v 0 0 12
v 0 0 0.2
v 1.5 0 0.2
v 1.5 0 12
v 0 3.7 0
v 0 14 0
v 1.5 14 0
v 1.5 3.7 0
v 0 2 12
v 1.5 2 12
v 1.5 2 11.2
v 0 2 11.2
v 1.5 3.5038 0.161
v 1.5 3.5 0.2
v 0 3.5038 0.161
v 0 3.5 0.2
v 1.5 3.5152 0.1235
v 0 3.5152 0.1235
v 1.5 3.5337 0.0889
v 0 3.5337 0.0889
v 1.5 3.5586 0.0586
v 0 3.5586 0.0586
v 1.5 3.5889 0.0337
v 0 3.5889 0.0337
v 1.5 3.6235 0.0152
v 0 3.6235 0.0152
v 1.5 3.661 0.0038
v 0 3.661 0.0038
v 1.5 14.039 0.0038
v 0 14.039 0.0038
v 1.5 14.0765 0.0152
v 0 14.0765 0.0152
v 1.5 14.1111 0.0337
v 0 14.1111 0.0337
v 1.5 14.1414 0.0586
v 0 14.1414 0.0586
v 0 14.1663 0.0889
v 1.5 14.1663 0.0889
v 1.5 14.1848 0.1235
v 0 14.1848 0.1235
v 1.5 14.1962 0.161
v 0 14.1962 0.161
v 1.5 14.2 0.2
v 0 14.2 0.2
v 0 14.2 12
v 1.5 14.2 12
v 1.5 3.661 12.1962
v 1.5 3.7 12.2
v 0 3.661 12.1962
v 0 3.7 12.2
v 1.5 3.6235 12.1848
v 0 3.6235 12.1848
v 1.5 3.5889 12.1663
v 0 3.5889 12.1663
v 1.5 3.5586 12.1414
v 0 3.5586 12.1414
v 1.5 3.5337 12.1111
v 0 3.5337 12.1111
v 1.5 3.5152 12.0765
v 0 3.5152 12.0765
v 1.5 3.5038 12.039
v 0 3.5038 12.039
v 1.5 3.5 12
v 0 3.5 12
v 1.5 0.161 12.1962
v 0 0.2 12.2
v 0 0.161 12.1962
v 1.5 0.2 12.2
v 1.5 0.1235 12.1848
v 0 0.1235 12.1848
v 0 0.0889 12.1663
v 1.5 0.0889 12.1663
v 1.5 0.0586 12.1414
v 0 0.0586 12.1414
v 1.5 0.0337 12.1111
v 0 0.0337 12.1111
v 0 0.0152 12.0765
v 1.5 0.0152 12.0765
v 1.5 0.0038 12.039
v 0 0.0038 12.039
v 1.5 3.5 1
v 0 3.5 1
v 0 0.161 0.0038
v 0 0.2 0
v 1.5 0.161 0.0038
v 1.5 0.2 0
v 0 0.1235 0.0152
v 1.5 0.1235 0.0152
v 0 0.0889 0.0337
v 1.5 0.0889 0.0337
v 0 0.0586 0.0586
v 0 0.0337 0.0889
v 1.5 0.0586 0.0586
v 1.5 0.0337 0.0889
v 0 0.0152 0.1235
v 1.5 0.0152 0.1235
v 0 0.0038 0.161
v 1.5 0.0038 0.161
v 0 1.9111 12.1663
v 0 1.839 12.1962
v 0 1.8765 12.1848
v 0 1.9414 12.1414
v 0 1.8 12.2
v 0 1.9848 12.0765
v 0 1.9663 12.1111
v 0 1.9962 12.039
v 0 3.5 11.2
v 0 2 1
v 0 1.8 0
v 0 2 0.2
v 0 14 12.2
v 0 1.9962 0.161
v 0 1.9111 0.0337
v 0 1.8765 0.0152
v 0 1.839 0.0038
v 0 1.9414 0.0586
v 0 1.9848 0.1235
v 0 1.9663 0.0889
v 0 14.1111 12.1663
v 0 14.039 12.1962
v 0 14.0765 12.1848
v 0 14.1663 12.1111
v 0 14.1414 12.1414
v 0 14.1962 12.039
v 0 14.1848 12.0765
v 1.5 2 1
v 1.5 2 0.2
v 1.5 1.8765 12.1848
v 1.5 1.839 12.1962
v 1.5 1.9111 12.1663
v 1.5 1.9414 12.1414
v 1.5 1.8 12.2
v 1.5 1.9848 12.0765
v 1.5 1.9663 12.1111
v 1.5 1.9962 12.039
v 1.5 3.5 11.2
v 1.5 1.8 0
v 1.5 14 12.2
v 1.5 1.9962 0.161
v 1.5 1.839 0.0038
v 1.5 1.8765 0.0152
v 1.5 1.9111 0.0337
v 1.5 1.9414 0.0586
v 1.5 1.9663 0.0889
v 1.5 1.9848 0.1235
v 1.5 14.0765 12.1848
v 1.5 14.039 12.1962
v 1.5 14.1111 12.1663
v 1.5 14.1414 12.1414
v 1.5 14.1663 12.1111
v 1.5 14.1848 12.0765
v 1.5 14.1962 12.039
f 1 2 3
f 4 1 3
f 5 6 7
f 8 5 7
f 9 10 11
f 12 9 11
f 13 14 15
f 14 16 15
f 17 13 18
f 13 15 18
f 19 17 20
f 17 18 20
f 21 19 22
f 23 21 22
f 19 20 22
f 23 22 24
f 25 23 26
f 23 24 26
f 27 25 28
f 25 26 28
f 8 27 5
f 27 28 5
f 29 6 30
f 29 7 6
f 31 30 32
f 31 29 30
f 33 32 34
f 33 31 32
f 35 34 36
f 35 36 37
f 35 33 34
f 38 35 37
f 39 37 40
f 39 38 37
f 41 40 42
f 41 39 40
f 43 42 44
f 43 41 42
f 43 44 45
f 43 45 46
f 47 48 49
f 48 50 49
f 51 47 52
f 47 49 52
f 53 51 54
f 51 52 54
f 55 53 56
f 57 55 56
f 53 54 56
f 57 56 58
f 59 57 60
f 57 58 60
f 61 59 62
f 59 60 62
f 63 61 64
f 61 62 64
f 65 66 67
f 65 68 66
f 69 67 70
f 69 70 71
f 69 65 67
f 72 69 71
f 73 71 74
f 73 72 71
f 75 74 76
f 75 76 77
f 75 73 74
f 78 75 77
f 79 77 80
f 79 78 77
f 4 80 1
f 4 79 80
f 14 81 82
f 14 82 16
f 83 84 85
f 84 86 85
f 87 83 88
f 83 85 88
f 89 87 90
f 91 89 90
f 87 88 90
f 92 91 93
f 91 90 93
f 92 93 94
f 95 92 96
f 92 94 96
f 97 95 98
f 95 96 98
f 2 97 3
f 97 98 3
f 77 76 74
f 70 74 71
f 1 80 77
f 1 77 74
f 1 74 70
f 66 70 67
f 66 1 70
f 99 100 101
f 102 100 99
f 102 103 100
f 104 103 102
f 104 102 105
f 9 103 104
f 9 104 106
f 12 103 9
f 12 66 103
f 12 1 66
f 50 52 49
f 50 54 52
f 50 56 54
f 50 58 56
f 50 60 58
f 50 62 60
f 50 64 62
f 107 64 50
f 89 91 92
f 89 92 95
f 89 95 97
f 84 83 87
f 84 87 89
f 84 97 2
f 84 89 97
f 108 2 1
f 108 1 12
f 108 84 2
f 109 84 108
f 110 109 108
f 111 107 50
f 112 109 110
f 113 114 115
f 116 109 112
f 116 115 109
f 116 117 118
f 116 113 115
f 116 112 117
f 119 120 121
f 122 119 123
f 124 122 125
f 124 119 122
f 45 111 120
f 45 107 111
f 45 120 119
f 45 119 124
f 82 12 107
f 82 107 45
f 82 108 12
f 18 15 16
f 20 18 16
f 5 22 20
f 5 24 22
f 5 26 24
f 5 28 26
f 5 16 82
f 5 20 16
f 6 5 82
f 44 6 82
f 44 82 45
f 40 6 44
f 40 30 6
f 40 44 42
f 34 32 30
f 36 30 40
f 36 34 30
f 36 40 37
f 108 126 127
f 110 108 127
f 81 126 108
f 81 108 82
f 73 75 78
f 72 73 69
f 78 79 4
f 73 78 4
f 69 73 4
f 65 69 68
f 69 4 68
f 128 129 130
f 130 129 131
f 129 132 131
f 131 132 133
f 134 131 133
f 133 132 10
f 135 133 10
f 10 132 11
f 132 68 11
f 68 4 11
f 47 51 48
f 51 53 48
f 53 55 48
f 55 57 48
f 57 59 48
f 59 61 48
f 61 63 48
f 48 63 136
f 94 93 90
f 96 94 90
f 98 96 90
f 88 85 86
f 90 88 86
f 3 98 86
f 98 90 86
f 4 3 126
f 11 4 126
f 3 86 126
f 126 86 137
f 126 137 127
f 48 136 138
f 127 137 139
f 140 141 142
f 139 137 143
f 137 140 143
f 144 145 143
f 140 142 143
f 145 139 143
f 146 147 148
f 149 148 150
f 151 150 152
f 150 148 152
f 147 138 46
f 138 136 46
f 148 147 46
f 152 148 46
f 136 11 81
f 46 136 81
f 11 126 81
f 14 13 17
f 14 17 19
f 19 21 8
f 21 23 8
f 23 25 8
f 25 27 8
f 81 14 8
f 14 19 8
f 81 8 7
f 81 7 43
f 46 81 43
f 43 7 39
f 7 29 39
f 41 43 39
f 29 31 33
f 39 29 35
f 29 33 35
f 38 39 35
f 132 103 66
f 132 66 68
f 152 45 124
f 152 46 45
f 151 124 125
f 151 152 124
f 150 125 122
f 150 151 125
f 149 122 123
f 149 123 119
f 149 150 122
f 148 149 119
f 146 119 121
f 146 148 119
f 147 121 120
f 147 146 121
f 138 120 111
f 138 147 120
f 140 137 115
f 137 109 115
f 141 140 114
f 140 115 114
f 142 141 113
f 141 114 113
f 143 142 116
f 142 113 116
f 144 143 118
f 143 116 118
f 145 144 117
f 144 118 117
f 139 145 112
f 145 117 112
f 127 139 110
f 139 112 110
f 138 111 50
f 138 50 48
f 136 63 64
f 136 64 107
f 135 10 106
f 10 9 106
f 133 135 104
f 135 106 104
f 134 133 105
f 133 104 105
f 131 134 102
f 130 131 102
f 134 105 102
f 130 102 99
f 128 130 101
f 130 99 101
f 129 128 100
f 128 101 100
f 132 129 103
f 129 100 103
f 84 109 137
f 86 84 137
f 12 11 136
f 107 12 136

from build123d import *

# Parameters (mm, degrees)
SKETCH_1_W          = 1.5
SKETCH_1_H          = 14.2
EXTRUDE_1_DEPTH     = 12.2
CUT_EXTRUDE_2_REACH = 20.781
SKETCH_5_W          = 2.597491907
SKETCH_5_H          = 1.5
SKETCH_5_W_2        = 2.655260115
FILLET_1_R          = 0.2


with BuildPart() as part:
    # 草图1 → 凸台-拉伸1 (new body)
    with BuildSketch(Plane.XY):
        with Locations((0.75, 7.1)):
            Rectangle(SKETCH_1_W, SKETCH_1_H)
    extrude(amount=EXTRUDE_1_DEPTH)

    # 草图5 → 切除-拉伸2 (cut, up to next)
    with BuildSketch(Plane(origin=(1.5, 0, 0), x_dir=(0, 0, -1), z_dir=(1, 0, 0)), mode=Mode.PRIVATE) as cut_extrude_2_sk1:
        with Locations((-12.498745954, 2.75)):
            Rectangle(SKETCH_5_W, SKETCH_5_H)
    cut_extrude_2_tool1 = extrude(cut_extrude_2_sk1.sketch, amount=-CUT_EXTRUDE_2_REACH, mode=Mode.PRIVATE) & part.part
    # 草图5 → 切除-拉伸2 (cut, up to next)
    with BuildSketch(Plane(origin=(1.5, 0, 0), x_dir=(0, 0, -1), z_dir=(1, 0, 0)), mode=Mode.PRIVATE) as cut_extrude_2_sk2:
        with Locations((0.327630058, 2.75)):
            Rectangle(SKETCH_5_W_2, SKETCH_5_H)
    cut_extrude_2_tool2 = extrude(cut_extrude_2_sk2.sketch, amount=-CUT_EXTRUDE_2_REACH, mode=Mode.PRIVATE) & part.part
    add(cut_extrude_2_tool1.solids().sort_by_distance((1.5, 2.75, 12.498746))[0], mode=Mode.SUBTRACT)
    add(cut_extrude_2_tool2.solids().sort_by_distance((1.5, 2.75, -0.32763))[0], mode=Mode.SUBTRACT)

    # 圆角1
    fillet_1_edges = [part.edges().sort_by_distance(p)[0] for p in [
        (0.75, 14.2, 12.2),
        (0.75, 3.5, 12.2),
        (0.75, 2, 12.2),
        (0.75, 3.5, 0),
        (0.75, 2, 0),
        (0.75, 14.2, 0),
        (0.75, 0, 0),
        (0.75, 0, 12.2),
    ]]
    fillet(fillet_1_edges, radius=FILLET_1_R)


solid = part.part
